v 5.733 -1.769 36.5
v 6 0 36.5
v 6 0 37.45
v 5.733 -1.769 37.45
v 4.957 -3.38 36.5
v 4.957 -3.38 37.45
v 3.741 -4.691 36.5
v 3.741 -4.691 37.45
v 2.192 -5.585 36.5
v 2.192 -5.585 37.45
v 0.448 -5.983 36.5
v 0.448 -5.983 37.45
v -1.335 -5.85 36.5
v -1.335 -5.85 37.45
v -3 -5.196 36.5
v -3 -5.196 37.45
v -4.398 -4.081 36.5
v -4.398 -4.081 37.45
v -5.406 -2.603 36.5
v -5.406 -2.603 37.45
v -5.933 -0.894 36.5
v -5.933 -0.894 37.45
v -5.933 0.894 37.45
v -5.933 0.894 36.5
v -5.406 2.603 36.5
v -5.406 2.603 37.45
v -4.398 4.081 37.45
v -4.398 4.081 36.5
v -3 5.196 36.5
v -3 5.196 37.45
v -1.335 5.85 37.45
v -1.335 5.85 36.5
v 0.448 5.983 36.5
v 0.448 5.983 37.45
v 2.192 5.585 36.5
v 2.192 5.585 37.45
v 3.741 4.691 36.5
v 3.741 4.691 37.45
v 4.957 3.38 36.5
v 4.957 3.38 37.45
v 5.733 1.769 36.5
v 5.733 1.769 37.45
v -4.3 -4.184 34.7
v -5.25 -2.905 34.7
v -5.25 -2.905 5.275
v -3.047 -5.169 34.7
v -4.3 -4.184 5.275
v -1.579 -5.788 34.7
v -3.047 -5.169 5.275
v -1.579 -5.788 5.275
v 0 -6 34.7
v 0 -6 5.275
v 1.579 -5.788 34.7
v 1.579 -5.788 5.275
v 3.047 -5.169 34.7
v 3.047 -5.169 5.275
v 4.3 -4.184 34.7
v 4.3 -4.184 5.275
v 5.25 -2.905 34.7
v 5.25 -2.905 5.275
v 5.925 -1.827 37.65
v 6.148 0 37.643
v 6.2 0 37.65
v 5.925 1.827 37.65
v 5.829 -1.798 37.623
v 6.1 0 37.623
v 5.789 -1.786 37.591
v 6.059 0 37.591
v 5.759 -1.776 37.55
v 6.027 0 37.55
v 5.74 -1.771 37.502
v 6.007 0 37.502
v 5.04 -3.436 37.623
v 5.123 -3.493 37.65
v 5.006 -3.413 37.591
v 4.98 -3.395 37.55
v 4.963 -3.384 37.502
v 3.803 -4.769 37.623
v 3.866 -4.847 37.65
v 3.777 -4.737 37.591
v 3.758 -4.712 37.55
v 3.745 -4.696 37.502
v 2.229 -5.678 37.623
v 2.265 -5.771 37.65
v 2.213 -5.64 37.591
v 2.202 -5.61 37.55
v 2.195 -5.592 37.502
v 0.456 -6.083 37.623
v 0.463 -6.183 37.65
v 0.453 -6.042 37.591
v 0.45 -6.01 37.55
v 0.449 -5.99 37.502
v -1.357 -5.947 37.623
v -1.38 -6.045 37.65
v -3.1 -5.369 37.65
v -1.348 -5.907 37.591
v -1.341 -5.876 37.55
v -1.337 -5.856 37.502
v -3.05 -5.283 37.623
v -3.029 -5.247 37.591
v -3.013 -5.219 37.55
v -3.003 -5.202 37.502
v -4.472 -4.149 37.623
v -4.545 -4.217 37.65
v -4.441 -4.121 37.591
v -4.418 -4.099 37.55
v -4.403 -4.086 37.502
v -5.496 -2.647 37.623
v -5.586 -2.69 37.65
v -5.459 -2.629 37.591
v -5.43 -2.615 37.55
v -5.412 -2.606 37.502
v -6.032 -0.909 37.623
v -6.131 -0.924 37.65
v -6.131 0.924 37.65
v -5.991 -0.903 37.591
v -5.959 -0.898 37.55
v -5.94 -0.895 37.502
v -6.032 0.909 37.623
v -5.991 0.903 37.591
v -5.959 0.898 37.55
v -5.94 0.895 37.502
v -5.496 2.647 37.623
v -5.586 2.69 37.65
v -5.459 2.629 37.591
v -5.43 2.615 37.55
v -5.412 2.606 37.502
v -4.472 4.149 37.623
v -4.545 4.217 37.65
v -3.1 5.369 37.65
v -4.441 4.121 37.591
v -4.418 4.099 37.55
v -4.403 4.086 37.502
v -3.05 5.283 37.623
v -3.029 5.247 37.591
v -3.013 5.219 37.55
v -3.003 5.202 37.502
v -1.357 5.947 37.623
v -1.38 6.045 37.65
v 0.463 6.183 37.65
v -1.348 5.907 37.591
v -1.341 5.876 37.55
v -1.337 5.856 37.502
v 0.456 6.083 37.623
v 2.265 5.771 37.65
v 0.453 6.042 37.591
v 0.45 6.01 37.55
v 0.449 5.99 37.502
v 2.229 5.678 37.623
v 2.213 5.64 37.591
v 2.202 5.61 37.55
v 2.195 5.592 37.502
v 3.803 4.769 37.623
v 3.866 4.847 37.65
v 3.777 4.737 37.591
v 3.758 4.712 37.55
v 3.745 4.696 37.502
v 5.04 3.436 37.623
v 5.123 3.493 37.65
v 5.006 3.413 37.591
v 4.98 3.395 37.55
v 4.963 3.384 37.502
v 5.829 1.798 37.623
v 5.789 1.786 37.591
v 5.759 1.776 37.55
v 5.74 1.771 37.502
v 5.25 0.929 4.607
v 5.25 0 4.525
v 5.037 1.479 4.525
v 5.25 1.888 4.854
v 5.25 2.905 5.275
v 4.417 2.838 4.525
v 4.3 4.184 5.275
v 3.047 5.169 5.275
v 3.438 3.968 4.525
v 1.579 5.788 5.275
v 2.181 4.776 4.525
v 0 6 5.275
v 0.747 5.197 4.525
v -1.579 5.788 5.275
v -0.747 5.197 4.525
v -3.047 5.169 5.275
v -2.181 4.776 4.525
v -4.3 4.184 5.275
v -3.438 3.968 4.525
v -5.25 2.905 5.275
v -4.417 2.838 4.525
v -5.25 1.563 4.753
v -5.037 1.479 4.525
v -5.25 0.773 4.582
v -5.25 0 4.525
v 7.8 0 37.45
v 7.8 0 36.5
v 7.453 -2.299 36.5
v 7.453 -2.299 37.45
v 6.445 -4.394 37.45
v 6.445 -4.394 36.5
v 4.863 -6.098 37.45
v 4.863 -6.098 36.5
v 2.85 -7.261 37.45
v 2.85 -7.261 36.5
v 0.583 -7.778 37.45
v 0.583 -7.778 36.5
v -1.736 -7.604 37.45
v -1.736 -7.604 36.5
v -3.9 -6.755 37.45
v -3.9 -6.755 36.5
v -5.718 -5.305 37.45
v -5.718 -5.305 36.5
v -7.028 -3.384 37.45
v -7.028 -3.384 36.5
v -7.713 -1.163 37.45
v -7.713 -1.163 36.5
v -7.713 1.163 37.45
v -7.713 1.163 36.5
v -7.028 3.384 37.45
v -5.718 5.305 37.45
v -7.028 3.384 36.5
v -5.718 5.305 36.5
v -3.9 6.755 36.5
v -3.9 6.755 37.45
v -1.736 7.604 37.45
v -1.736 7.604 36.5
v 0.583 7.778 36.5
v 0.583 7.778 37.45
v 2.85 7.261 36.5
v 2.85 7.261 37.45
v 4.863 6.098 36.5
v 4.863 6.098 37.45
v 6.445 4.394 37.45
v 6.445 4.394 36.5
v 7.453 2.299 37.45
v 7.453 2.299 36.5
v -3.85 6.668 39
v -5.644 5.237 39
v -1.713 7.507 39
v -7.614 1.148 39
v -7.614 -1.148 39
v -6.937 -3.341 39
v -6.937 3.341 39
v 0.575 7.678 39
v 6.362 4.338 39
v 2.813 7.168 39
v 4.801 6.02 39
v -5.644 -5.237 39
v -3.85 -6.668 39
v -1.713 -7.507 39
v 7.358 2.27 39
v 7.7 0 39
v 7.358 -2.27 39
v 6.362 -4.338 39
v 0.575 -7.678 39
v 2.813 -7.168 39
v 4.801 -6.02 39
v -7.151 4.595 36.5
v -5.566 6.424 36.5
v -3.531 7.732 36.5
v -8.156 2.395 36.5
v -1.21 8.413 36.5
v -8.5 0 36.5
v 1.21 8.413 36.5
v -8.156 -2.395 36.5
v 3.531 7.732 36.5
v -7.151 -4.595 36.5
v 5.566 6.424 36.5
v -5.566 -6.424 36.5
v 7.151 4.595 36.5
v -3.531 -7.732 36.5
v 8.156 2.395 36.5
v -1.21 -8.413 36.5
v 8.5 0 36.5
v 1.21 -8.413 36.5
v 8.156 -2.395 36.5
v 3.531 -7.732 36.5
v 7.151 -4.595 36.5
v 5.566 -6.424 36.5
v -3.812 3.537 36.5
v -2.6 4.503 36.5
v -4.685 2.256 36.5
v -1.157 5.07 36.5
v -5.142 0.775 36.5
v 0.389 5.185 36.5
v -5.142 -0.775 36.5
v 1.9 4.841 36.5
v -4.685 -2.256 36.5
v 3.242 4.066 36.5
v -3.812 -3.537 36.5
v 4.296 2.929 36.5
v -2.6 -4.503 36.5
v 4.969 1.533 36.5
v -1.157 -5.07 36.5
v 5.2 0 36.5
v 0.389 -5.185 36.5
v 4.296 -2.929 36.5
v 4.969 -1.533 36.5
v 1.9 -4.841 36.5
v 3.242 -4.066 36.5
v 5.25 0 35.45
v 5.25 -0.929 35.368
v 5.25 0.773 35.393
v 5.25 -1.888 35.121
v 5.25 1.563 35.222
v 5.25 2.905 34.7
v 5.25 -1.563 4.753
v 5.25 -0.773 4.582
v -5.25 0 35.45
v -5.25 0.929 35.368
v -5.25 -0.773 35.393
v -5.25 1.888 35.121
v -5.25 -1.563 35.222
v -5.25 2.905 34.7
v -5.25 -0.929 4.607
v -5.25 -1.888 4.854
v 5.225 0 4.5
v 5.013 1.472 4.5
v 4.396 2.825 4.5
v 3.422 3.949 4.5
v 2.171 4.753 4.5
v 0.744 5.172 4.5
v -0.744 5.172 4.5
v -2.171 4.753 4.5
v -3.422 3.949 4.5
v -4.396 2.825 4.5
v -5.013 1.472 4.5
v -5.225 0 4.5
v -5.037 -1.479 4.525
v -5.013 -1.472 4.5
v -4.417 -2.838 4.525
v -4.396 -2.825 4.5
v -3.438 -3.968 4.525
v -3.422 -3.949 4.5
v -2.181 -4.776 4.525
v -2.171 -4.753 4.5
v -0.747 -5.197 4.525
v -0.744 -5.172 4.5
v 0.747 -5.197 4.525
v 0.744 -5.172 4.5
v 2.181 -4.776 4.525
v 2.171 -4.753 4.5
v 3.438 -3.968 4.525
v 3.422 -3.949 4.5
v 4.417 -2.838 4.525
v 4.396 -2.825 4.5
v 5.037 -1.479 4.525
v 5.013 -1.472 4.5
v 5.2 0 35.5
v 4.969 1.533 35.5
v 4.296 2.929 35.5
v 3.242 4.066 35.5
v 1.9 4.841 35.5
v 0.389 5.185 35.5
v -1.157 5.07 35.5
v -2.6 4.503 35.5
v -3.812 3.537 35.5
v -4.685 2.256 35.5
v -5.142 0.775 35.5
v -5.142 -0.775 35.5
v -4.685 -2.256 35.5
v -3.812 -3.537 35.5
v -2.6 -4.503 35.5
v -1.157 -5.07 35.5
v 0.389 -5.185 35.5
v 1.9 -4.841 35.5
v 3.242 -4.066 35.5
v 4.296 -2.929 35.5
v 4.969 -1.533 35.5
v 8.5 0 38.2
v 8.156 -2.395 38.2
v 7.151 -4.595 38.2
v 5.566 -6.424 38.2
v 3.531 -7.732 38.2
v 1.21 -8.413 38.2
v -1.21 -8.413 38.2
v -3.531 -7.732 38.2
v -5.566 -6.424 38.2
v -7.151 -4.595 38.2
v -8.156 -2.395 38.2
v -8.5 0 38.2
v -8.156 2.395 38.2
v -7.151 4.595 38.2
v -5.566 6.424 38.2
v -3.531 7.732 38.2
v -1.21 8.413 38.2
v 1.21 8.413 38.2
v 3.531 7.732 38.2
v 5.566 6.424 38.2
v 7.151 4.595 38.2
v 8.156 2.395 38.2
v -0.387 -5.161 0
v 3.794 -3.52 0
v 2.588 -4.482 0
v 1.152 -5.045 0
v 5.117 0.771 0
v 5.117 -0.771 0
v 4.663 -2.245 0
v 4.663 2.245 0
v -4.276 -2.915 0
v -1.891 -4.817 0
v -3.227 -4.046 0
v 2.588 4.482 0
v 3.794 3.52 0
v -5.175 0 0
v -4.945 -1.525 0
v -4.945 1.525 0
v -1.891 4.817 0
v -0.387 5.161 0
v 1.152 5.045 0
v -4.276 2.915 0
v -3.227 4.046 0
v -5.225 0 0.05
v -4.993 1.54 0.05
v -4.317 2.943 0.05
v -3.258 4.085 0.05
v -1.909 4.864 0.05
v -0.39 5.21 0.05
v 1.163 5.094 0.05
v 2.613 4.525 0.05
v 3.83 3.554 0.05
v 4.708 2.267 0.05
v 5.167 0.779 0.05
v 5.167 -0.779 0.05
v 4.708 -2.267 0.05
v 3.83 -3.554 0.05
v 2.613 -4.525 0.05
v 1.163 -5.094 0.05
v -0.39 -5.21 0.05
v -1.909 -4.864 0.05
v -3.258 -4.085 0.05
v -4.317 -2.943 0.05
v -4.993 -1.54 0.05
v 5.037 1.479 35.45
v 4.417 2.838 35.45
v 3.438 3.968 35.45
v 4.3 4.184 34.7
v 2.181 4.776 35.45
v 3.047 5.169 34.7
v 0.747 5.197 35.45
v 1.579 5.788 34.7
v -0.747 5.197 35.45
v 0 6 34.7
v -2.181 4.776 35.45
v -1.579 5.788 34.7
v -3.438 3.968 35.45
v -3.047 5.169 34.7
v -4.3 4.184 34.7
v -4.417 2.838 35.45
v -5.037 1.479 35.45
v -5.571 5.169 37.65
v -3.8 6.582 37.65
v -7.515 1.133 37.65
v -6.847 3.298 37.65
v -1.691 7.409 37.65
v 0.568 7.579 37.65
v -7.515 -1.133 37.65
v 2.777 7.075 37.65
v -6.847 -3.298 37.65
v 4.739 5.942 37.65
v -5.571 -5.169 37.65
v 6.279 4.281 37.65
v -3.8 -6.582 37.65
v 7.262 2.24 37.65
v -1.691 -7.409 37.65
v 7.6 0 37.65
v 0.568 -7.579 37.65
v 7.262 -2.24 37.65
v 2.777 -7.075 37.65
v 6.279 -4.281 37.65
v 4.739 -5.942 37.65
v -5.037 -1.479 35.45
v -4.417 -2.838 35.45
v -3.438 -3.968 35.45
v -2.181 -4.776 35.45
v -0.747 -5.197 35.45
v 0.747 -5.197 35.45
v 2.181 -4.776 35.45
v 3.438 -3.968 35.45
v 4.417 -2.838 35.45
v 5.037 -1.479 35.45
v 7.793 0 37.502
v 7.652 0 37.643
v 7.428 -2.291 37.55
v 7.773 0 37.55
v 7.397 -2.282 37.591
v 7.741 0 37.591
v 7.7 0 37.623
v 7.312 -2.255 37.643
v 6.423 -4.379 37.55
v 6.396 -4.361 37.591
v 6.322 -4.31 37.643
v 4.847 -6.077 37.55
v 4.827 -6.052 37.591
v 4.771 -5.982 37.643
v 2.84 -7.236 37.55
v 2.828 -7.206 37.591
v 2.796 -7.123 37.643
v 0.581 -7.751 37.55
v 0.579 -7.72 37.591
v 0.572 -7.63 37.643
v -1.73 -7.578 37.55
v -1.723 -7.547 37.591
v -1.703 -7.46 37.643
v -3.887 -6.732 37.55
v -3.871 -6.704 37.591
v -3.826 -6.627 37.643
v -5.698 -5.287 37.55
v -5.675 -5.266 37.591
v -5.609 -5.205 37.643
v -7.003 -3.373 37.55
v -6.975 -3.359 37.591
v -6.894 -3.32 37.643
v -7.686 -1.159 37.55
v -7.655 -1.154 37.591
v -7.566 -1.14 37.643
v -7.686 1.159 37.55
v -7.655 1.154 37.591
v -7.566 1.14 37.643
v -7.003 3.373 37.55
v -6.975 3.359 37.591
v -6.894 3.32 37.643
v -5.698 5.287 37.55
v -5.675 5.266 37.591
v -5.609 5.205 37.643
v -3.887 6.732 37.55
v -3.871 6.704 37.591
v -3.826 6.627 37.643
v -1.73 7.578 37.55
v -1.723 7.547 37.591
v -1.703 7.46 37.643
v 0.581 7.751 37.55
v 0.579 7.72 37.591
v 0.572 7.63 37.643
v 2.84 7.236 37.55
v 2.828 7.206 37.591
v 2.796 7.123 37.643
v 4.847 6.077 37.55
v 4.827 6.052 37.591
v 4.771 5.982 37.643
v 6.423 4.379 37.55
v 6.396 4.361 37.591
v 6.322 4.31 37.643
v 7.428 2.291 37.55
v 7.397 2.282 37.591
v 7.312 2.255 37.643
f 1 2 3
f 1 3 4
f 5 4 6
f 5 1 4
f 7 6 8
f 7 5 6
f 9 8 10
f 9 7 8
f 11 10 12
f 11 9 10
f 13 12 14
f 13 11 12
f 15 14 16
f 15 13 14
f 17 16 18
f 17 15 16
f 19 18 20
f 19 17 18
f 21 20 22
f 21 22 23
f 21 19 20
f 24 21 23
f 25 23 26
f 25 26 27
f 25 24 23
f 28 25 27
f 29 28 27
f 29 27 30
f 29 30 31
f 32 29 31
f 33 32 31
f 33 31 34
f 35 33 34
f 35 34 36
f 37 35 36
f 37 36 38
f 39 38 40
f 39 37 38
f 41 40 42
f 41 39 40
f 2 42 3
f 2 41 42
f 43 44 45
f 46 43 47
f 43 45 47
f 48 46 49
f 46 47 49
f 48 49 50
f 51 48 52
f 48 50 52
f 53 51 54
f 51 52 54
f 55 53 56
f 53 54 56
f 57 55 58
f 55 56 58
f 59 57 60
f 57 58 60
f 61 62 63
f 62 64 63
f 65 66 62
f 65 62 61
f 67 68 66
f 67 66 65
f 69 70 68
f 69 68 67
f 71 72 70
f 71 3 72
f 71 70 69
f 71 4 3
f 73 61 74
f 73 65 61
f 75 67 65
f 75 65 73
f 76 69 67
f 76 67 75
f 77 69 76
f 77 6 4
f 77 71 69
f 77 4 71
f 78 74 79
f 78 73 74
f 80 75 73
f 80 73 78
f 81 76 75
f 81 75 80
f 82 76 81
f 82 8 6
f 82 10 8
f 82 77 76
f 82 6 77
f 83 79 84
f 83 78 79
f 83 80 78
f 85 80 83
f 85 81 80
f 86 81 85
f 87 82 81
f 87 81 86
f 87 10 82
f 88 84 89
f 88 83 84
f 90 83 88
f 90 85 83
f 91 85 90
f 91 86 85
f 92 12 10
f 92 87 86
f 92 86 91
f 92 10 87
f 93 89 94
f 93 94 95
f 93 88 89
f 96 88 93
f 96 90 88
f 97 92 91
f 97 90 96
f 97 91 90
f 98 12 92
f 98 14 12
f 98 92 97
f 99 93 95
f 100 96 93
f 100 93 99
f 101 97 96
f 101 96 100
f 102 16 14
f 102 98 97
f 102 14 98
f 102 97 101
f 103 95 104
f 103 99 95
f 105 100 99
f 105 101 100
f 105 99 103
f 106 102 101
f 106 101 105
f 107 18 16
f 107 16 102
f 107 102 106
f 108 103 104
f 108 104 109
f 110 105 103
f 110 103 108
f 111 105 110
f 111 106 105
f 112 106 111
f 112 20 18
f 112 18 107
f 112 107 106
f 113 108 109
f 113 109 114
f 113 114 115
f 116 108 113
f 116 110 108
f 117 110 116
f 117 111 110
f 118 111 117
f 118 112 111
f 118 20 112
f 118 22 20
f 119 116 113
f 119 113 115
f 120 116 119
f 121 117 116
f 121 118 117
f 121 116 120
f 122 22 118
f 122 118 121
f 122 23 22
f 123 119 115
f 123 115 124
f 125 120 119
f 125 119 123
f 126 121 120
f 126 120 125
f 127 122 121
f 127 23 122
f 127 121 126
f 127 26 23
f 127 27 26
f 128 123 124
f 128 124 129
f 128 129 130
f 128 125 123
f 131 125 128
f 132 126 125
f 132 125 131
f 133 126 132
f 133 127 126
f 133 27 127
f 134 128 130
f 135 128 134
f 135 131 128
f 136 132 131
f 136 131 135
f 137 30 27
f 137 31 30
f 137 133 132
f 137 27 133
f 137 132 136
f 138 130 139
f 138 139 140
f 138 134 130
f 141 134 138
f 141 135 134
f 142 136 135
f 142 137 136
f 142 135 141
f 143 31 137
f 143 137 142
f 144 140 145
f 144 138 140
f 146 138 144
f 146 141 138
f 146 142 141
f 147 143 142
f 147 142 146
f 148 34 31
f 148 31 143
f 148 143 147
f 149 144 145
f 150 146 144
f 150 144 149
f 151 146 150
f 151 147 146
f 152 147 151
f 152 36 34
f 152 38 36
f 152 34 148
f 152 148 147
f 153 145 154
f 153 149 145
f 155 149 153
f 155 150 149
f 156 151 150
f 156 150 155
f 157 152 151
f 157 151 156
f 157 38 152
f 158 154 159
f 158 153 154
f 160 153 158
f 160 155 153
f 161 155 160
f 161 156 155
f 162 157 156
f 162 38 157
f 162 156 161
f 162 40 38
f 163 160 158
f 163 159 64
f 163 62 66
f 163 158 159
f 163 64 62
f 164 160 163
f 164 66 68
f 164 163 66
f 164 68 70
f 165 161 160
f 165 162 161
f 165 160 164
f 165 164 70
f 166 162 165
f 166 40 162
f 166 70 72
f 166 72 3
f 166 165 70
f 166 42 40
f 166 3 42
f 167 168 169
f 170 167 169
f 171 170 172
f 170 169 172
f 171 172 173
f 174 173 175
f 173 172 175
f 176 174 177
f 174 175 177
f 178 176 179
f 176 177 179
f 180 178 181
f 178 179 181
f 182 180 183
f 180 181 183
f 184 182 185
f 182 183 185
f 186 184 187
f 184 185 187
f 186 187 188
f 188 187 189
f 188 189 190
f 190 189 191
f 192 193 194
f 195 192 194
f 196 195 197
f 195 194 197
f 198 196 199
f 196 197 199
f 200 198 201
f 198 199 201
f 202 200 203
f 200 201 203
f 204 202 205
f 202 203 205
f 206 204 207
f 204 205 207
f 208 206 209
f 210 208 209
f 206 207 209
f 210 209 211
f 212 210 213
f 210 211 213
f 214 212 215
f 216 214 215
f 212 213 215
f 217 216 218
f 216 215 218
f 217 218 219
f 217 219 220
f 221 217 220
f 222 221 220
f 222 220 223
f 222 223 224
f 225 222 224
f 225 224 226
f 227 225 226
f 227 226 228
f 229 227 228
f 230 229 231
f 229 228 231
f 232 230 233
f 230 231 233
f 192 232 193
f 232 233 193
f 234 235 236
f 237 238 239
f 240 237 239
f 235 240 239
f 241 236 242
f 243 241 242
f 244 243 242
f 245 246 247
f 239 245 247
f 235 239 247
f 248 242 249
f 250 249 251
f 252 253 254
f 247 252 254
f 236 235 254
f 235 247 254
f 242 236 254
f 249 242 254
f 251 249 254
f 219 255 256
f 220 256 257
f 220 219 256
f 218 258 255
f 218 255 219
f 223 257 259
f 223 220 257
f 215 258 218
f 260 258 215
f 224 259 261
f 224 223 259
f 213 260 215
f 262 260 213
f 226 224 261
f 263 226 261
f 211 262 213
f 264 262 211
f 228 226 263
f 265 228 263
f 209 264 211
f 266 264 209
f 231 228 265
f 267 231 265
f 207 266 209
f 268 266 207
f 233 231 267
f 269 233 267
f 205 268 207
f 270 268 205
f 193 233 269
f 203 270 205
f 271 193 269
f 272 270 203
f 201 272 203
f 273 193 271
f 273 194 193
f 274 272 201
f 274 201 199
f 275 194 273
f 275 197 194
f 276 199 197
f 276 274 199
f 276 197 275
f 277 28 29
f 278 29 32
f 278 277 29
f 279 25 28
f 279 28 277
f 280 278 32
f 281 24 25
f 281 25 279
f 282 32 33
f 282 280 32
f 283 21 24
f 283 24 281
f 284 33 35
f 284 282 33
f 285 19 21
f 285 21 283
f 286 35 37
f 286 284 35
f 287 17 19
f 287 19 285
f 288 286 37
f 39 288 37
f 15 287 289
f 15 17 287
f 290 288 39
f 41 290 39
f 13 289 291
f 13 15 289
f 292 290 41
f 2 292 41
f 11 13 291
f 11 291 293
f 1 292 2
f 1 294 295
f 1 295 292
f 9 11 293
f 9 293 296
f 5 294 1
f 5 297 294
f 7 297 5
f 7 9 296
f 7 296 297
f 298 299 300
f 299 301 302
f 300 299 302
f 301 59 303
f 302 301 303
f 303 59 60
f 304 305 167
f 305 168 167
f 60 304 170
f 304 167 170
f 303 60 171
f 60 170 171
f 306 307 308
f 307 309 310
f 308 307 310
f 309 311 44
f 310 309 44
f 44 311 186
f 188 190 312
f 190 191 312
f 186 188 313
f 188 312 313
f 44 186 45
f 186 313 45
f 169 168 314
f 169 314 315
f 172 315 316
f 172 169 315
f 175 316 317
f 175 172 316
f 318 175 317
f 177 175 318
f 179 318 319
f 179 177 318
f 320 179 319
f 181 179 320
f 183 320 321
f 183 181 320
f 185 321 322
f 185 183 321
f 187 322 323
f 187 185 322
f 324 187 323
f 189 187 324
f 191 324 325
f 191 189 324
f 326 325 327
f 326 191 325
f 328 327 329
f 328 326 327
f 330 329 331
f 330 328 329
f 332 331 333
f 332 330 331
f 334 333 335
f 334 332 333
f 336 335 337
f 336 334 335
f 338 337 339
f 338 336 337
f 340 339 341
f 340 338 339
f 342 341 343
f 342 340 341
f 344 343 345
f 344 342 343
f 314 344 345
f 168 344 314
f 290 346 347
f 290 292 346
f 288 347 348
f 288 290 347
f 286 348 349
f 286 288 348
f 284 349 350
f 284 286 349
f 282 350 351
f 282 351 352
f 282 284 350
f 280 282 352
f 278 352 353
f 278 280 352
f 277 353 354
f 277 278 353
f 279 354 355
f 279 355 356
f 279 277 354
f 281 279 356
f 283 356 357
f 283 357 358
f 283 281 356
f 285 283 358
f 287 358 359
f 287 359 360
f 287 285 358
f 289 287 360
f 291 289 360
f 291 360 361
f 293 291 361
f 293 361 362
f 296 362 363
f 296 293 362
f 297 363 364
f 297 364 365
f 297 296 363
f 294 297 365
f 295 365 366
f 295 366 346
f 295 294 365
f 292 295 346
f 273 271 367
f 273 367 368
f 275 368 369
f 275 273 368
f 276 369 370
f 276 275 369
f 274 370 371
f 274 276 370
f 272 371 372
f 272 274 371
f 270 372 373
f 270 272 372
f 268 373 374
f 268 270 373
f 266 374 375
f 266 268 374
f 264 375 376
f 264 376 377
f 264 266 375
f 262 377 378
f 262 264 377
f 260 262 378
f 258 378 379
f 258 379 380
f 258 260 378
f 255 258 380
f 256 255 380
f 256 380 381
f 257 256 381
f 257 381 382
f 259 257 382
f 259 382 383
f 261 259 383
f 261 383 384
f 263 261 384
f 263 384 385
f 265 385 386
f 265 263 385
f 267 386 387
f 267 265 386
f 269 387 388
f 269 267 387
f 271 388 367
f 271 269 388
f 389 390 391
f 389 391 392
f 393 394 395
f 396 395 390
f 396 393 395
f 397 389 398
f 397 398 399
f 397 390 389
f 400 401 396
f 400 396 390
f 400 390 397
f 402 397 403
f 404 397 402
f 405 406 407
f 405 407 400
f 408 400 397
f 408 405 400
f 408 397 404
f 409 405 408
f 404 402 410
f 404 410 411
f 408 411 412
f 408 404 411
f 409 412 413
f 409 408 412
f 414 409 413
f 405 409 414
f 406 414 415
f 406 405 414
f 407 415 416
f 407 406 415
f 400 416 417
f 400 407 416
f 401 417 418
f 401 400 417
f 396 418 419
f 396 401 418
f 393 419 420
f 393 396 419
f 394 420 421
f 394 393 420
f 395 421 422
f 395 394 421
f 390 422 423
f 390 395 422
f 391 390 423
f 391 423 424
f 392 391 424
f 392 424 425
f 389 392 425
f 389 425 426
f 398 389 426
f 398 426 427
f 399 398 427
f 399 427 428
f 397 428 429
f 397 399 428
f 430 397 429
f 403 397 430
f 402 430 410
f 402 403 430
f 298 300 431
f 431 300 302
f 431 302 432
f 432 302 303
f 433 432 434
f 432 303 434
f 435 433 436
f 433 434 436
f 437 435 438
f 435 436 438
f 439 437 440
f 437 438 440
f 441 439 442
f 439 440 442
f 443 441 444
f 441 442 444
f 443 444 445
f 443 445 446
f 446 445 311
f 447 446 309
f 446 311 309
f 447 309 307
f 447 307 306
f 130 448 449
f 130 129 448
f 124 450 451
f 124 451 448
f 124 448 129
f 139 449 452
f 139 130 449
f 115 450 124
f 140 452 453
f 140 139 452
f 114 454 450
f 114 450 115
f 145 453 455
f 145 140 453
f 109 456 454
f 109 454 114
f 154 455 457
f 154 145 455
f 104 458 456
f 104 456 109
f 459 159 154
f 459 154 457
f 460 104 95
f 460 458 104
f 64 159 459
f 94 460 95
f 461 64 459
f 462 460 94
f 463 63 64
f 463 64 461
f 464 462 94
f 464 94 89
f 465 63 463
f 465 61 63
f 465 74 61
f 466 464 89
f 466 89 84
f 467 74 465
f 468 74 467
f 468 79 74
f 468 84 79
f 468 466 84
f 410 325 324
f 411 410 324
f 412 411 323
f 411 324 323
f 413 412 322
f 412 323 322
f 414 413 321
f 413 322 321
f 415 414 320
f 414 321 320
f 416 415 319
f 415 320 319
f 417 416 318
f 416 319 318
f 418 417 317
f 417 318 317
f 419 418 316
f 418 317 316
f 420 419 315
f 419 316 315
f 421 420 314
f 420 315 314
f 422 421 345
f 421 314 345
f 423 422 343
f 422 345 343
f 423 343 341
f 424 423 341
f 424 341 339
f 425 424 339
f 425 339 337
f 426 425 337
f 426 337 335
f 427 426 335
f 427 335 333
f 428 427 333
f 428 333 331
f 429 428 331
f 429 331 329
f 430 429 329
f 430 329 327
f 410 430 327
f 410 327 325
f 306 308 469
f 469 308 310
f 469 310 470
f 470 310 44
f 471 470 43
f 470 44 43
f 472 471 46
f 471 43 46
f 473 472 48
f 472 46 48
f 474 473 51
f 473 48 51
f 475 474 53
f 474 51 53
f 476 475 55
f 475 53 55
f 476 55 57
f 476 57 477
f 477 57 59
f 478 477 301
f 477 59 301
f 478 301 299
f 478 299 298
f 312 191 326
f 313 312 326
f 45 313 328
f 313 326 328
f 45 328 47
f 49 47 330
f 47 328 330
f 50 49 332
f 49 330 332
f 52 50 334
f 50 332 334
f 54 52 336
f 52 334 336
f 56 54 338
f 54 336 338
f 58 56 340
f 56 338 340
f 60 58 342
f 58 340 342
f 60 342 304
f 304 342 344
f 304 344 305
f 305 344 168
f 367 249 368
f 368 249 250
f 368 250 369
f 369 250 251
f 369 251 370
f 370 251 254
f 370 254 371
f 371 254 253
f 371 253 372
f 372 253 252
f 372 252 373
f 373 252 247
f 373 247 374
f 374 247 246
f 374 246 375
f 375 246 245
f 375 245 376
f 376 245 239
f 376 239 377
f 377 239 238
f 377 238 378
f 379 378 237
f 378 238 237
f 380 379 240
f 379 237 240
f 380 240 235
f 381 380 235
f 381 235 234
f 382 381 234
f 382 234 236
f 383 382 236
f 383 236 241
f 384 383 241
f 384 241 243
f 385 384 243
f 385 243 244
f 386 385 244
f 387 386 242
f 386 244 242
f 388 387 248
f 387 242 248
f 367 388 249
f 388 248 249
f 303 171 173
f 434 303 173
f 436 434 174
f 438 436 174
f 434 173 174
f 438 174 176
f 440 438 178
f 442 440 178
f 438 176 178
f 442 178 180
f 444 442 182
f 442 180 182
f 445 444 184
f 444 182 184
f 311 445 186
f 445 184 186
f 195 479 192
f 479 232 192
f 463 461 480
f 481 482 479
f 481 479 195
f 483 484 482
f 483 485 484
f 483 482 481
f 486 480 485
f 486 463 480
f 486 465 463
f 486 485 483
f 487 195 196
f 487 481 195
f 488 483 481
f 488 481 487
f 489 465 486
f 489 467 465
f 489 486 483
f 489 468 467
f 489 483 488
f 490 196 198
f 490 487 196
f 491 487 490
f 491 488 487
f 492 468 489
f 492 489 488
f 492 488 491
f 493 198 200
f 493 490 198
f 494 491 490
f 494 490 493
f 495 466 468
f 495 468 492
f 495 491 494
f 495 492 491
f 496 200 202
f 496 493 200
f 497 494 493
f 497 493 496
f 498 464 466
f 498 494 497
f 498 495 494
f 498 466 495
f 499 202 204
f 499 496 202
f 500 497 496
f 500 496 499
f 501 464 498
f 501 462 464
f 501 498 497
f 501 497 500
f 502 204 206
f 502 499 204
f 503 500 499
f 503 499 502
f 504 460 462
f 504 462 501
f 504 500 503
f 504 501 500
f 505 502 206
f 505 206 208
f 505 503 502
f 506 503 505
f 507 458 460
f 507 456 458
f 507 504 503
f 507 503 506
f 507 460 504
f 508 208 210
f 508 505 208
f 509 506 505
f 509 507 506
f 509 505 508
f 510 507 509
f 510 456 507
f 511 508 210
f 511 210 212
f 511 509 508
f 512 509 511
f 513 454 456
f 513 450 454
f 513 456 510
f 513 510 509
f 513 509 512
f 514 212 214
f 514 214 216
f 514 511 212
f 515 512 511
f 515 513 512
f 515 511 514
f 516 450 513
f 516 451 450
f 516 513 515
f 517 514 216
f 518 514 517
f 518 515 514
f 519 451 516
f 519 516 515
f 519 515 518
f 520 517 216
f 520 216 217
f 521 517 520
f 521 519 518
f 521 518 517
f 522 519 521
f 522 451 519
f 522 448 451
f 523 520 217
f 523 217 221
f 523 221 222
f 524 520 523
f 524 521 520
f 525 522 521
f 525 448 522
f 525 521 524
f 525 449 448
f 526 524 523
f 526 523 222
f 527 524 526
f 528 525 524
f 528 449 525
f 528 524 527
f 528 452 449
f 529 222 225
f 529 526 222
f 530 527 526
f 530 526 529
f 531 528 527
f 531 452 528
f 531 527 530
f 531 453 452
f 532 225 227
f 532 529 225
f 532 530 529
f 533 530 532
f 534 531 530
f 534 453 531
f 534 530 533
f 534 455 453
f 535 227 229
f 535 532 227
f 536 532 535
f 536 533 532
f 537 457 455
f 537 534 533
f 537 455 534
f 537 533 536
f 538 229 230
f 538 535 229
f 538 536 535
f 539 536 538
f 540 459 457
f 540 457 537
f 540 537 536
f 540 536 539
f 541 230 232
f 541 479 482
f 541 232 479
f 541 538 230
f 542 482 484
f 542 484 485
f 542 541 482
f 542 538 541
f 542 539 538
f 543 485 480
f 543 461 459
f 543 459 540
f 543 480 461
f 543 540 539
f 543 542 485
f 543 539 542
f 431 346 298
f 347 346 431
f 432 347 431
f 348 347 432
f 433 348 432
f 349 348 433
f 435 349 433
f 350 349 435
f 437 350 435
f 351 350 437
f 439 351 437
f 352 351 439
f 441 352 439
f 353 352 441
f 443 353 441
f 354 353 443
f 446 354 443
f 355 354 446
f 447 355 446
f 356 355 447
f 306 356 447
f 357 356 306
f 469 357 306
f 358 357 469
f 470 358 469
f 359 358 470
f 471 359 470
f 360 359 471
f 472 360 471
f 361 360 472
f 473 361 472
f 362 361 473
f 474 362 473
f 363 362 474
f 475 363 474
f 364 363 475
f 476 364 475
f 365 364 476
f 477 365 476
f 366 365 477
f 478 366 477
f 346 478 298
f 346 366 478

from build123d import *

# Parameters (mm, degrees)
BOSS_EXTRUDE1_START       = 4.524999897
BOSS_EXTRUDE1_2_OUTLINE_R = 5.225
BOSS_EXTRUDE1_2_DEPTH     = 30.925000207
SKETCH2_R                 = 8.5
BOSS_EXTRUDE2_DEPTH       = 2.5
SKETCH3_R                 = 7.8
SKETCH3_R_2               = 6
CUT_EXTRUDE1_DEPTH        = 1.15
SKETCH4_R                 = 5.225
BOSS_EXTRUDE3_DEPTH       = 4.5
CHAMFER1_SIZE             = 0.05
CHAMFER2_SIZE             = 0.799999999
CHAMFER2_SIZE2            = 0.800000001
FILLET1_R                 = 0.2


with BuildPart() as part:
    # Boss-Extrude1: read off the stored shape, not the designer's step
    # Boss-Extrude1 outline → Boss-Extrude1 (revolve)
    with BuildSketch(Plane.XZ):
        Polygon((5.225, 4.499999999), (5.225, 35.475000001), (5.2, 35.500000001), (5.2, 36.5), (0, 36.5), (0, 4.499999999), align=None)
    revolve(axis=Axis((0, 0, 0), (0, 0, 1)))

    # Boss-Extrude1 2 outline → Boss-Extrude1 2 (add)
    with BuildSketch(Plane.XY.offset(BOSS_EXTRUDE1_START)):
        with BuildLine():
            ThreePointArc((5.25, 2.904737509), (0, 6), (-5.25, 2.904737509))
            Line((-5.25, 2.904737509), (-5.25, -2.90473751))
            ThreePointArc((-5.25, -2.90473751), (0, -6), (5.25, -2.90473751))
            Line((5.25, -2.90473751), (5.25, 2.904737509))
        make_face()
        Circle(BOSS_EXTRUDE1_2_OUTLINE_R, mode=Mode.SUBTRACT)
    extrude(amount=BOSS_EXTRUDE1_2_DEPTH)

    # Boss-Extrude1 3 outline → Boss-Extrude1 3 (revolve, cut)
    with BuildSketch(Plane.XZ):
        Polygon((6, 5.275000001), (5.249999898, 4.524999897), (6, 4.524999897), align=None)
        Polygon((5.249999897, 35.450000104), (6, 34.699999999), (6, 35.450000104), align=None)
    revolve(axis=Axis((0, 0, 0), (0, 0, 1)), mode=Mode.SUBTRACT)

    # Boss-Extrude1 4 outline → Boss-Extrude1 4 (revolve)
    with BuildSketch(Plane.XZ):
        Polygon((5.225, 4.524999897), (5.225, 4.499999999), (5.249999898, 4.524999897), align=None)
        Polygon((5.225, 35.450000104), (5.249999897, 35.450000104), (5.225, 35.475000001), align=None)
    revolve(axis=Axis((0, 0, 0), (0, 0, 1)))

    # Sketch2 → Boss-Extrude2 (add)
    with BuildSketch(Plane(origin=(0, 0, 36.5), x_dir=(-1, 0, 0), z_dir=(0, 0, -1))):
        with Locations(Location((0, 0, 0), (0, 0, 180))):
            Circle(SKETCH2_R)
    extrude(amount=-BOSS_EXTRUDE2_DEPTH)

    # Sketch3 → Cut-Extrude1 (cut)
    with BuildSketch(Plane(origin=(0, 0, 36.5), x_dir=(-1, 0, 0), z_dir=(0, 0, -1))):
        with Locations(Location((0, 0, 0), (0, 0, 180))):
            Circle(SKETCH3_R)
        with Locations(Location((0, 0, 0), (0, 0, 180))):
            Circle(SKETCH3_R_2, mode=Mode.SUBTRACT)
    extrude(amount=-CUT_EXTRUDE1_DEPTH, mode=Mode.SUBTRACT)

    # Sketch4 → Boss-Extrude3 (add)
    with BuildSketch(Plane(origin=(0, 0, 4.5), x_dir=(-1, 0, 0), z_dir=(0, 0, -1))):
        Circle(SKETCH4_R)
    extrude(amount=BOSS_EXTRUDE3_DEPTH)

    # Chamfer1
    chamfer1_edges = [part.edges().sort_by_distance(p)[0] for p in [
        (5.225, 0, 0),
    ]]
    chamfer(chamfer1_edges, length=CHAMFER1_SIZE)

    # Chamfer2
    chamfer2_edges = [part.edges().sort_by_distance(p)[0] for p in [
        (-8.5, 0, 39),
    ]]
    chamfer2_side = [part.faces().sort_by_distance(p)[0] for p in [
        (-8.5, 0, 37.75),
    ]]
    chamfer(chamfer2_edges, length=CHAMFER2_SIZE, length2=CHAMFER2_SIZE2, reference=chamfer2_side[0])

    # Fillet1
    fillet1_edges = [part.edges().sort_by_distance(p)[0] for p in [
        (-7.8, 0, 37.65),
        (-6, 0, 37.65),
    ]]
    fillet(fillet1_edges, radius=FILLET1_R)


solid = part.part
